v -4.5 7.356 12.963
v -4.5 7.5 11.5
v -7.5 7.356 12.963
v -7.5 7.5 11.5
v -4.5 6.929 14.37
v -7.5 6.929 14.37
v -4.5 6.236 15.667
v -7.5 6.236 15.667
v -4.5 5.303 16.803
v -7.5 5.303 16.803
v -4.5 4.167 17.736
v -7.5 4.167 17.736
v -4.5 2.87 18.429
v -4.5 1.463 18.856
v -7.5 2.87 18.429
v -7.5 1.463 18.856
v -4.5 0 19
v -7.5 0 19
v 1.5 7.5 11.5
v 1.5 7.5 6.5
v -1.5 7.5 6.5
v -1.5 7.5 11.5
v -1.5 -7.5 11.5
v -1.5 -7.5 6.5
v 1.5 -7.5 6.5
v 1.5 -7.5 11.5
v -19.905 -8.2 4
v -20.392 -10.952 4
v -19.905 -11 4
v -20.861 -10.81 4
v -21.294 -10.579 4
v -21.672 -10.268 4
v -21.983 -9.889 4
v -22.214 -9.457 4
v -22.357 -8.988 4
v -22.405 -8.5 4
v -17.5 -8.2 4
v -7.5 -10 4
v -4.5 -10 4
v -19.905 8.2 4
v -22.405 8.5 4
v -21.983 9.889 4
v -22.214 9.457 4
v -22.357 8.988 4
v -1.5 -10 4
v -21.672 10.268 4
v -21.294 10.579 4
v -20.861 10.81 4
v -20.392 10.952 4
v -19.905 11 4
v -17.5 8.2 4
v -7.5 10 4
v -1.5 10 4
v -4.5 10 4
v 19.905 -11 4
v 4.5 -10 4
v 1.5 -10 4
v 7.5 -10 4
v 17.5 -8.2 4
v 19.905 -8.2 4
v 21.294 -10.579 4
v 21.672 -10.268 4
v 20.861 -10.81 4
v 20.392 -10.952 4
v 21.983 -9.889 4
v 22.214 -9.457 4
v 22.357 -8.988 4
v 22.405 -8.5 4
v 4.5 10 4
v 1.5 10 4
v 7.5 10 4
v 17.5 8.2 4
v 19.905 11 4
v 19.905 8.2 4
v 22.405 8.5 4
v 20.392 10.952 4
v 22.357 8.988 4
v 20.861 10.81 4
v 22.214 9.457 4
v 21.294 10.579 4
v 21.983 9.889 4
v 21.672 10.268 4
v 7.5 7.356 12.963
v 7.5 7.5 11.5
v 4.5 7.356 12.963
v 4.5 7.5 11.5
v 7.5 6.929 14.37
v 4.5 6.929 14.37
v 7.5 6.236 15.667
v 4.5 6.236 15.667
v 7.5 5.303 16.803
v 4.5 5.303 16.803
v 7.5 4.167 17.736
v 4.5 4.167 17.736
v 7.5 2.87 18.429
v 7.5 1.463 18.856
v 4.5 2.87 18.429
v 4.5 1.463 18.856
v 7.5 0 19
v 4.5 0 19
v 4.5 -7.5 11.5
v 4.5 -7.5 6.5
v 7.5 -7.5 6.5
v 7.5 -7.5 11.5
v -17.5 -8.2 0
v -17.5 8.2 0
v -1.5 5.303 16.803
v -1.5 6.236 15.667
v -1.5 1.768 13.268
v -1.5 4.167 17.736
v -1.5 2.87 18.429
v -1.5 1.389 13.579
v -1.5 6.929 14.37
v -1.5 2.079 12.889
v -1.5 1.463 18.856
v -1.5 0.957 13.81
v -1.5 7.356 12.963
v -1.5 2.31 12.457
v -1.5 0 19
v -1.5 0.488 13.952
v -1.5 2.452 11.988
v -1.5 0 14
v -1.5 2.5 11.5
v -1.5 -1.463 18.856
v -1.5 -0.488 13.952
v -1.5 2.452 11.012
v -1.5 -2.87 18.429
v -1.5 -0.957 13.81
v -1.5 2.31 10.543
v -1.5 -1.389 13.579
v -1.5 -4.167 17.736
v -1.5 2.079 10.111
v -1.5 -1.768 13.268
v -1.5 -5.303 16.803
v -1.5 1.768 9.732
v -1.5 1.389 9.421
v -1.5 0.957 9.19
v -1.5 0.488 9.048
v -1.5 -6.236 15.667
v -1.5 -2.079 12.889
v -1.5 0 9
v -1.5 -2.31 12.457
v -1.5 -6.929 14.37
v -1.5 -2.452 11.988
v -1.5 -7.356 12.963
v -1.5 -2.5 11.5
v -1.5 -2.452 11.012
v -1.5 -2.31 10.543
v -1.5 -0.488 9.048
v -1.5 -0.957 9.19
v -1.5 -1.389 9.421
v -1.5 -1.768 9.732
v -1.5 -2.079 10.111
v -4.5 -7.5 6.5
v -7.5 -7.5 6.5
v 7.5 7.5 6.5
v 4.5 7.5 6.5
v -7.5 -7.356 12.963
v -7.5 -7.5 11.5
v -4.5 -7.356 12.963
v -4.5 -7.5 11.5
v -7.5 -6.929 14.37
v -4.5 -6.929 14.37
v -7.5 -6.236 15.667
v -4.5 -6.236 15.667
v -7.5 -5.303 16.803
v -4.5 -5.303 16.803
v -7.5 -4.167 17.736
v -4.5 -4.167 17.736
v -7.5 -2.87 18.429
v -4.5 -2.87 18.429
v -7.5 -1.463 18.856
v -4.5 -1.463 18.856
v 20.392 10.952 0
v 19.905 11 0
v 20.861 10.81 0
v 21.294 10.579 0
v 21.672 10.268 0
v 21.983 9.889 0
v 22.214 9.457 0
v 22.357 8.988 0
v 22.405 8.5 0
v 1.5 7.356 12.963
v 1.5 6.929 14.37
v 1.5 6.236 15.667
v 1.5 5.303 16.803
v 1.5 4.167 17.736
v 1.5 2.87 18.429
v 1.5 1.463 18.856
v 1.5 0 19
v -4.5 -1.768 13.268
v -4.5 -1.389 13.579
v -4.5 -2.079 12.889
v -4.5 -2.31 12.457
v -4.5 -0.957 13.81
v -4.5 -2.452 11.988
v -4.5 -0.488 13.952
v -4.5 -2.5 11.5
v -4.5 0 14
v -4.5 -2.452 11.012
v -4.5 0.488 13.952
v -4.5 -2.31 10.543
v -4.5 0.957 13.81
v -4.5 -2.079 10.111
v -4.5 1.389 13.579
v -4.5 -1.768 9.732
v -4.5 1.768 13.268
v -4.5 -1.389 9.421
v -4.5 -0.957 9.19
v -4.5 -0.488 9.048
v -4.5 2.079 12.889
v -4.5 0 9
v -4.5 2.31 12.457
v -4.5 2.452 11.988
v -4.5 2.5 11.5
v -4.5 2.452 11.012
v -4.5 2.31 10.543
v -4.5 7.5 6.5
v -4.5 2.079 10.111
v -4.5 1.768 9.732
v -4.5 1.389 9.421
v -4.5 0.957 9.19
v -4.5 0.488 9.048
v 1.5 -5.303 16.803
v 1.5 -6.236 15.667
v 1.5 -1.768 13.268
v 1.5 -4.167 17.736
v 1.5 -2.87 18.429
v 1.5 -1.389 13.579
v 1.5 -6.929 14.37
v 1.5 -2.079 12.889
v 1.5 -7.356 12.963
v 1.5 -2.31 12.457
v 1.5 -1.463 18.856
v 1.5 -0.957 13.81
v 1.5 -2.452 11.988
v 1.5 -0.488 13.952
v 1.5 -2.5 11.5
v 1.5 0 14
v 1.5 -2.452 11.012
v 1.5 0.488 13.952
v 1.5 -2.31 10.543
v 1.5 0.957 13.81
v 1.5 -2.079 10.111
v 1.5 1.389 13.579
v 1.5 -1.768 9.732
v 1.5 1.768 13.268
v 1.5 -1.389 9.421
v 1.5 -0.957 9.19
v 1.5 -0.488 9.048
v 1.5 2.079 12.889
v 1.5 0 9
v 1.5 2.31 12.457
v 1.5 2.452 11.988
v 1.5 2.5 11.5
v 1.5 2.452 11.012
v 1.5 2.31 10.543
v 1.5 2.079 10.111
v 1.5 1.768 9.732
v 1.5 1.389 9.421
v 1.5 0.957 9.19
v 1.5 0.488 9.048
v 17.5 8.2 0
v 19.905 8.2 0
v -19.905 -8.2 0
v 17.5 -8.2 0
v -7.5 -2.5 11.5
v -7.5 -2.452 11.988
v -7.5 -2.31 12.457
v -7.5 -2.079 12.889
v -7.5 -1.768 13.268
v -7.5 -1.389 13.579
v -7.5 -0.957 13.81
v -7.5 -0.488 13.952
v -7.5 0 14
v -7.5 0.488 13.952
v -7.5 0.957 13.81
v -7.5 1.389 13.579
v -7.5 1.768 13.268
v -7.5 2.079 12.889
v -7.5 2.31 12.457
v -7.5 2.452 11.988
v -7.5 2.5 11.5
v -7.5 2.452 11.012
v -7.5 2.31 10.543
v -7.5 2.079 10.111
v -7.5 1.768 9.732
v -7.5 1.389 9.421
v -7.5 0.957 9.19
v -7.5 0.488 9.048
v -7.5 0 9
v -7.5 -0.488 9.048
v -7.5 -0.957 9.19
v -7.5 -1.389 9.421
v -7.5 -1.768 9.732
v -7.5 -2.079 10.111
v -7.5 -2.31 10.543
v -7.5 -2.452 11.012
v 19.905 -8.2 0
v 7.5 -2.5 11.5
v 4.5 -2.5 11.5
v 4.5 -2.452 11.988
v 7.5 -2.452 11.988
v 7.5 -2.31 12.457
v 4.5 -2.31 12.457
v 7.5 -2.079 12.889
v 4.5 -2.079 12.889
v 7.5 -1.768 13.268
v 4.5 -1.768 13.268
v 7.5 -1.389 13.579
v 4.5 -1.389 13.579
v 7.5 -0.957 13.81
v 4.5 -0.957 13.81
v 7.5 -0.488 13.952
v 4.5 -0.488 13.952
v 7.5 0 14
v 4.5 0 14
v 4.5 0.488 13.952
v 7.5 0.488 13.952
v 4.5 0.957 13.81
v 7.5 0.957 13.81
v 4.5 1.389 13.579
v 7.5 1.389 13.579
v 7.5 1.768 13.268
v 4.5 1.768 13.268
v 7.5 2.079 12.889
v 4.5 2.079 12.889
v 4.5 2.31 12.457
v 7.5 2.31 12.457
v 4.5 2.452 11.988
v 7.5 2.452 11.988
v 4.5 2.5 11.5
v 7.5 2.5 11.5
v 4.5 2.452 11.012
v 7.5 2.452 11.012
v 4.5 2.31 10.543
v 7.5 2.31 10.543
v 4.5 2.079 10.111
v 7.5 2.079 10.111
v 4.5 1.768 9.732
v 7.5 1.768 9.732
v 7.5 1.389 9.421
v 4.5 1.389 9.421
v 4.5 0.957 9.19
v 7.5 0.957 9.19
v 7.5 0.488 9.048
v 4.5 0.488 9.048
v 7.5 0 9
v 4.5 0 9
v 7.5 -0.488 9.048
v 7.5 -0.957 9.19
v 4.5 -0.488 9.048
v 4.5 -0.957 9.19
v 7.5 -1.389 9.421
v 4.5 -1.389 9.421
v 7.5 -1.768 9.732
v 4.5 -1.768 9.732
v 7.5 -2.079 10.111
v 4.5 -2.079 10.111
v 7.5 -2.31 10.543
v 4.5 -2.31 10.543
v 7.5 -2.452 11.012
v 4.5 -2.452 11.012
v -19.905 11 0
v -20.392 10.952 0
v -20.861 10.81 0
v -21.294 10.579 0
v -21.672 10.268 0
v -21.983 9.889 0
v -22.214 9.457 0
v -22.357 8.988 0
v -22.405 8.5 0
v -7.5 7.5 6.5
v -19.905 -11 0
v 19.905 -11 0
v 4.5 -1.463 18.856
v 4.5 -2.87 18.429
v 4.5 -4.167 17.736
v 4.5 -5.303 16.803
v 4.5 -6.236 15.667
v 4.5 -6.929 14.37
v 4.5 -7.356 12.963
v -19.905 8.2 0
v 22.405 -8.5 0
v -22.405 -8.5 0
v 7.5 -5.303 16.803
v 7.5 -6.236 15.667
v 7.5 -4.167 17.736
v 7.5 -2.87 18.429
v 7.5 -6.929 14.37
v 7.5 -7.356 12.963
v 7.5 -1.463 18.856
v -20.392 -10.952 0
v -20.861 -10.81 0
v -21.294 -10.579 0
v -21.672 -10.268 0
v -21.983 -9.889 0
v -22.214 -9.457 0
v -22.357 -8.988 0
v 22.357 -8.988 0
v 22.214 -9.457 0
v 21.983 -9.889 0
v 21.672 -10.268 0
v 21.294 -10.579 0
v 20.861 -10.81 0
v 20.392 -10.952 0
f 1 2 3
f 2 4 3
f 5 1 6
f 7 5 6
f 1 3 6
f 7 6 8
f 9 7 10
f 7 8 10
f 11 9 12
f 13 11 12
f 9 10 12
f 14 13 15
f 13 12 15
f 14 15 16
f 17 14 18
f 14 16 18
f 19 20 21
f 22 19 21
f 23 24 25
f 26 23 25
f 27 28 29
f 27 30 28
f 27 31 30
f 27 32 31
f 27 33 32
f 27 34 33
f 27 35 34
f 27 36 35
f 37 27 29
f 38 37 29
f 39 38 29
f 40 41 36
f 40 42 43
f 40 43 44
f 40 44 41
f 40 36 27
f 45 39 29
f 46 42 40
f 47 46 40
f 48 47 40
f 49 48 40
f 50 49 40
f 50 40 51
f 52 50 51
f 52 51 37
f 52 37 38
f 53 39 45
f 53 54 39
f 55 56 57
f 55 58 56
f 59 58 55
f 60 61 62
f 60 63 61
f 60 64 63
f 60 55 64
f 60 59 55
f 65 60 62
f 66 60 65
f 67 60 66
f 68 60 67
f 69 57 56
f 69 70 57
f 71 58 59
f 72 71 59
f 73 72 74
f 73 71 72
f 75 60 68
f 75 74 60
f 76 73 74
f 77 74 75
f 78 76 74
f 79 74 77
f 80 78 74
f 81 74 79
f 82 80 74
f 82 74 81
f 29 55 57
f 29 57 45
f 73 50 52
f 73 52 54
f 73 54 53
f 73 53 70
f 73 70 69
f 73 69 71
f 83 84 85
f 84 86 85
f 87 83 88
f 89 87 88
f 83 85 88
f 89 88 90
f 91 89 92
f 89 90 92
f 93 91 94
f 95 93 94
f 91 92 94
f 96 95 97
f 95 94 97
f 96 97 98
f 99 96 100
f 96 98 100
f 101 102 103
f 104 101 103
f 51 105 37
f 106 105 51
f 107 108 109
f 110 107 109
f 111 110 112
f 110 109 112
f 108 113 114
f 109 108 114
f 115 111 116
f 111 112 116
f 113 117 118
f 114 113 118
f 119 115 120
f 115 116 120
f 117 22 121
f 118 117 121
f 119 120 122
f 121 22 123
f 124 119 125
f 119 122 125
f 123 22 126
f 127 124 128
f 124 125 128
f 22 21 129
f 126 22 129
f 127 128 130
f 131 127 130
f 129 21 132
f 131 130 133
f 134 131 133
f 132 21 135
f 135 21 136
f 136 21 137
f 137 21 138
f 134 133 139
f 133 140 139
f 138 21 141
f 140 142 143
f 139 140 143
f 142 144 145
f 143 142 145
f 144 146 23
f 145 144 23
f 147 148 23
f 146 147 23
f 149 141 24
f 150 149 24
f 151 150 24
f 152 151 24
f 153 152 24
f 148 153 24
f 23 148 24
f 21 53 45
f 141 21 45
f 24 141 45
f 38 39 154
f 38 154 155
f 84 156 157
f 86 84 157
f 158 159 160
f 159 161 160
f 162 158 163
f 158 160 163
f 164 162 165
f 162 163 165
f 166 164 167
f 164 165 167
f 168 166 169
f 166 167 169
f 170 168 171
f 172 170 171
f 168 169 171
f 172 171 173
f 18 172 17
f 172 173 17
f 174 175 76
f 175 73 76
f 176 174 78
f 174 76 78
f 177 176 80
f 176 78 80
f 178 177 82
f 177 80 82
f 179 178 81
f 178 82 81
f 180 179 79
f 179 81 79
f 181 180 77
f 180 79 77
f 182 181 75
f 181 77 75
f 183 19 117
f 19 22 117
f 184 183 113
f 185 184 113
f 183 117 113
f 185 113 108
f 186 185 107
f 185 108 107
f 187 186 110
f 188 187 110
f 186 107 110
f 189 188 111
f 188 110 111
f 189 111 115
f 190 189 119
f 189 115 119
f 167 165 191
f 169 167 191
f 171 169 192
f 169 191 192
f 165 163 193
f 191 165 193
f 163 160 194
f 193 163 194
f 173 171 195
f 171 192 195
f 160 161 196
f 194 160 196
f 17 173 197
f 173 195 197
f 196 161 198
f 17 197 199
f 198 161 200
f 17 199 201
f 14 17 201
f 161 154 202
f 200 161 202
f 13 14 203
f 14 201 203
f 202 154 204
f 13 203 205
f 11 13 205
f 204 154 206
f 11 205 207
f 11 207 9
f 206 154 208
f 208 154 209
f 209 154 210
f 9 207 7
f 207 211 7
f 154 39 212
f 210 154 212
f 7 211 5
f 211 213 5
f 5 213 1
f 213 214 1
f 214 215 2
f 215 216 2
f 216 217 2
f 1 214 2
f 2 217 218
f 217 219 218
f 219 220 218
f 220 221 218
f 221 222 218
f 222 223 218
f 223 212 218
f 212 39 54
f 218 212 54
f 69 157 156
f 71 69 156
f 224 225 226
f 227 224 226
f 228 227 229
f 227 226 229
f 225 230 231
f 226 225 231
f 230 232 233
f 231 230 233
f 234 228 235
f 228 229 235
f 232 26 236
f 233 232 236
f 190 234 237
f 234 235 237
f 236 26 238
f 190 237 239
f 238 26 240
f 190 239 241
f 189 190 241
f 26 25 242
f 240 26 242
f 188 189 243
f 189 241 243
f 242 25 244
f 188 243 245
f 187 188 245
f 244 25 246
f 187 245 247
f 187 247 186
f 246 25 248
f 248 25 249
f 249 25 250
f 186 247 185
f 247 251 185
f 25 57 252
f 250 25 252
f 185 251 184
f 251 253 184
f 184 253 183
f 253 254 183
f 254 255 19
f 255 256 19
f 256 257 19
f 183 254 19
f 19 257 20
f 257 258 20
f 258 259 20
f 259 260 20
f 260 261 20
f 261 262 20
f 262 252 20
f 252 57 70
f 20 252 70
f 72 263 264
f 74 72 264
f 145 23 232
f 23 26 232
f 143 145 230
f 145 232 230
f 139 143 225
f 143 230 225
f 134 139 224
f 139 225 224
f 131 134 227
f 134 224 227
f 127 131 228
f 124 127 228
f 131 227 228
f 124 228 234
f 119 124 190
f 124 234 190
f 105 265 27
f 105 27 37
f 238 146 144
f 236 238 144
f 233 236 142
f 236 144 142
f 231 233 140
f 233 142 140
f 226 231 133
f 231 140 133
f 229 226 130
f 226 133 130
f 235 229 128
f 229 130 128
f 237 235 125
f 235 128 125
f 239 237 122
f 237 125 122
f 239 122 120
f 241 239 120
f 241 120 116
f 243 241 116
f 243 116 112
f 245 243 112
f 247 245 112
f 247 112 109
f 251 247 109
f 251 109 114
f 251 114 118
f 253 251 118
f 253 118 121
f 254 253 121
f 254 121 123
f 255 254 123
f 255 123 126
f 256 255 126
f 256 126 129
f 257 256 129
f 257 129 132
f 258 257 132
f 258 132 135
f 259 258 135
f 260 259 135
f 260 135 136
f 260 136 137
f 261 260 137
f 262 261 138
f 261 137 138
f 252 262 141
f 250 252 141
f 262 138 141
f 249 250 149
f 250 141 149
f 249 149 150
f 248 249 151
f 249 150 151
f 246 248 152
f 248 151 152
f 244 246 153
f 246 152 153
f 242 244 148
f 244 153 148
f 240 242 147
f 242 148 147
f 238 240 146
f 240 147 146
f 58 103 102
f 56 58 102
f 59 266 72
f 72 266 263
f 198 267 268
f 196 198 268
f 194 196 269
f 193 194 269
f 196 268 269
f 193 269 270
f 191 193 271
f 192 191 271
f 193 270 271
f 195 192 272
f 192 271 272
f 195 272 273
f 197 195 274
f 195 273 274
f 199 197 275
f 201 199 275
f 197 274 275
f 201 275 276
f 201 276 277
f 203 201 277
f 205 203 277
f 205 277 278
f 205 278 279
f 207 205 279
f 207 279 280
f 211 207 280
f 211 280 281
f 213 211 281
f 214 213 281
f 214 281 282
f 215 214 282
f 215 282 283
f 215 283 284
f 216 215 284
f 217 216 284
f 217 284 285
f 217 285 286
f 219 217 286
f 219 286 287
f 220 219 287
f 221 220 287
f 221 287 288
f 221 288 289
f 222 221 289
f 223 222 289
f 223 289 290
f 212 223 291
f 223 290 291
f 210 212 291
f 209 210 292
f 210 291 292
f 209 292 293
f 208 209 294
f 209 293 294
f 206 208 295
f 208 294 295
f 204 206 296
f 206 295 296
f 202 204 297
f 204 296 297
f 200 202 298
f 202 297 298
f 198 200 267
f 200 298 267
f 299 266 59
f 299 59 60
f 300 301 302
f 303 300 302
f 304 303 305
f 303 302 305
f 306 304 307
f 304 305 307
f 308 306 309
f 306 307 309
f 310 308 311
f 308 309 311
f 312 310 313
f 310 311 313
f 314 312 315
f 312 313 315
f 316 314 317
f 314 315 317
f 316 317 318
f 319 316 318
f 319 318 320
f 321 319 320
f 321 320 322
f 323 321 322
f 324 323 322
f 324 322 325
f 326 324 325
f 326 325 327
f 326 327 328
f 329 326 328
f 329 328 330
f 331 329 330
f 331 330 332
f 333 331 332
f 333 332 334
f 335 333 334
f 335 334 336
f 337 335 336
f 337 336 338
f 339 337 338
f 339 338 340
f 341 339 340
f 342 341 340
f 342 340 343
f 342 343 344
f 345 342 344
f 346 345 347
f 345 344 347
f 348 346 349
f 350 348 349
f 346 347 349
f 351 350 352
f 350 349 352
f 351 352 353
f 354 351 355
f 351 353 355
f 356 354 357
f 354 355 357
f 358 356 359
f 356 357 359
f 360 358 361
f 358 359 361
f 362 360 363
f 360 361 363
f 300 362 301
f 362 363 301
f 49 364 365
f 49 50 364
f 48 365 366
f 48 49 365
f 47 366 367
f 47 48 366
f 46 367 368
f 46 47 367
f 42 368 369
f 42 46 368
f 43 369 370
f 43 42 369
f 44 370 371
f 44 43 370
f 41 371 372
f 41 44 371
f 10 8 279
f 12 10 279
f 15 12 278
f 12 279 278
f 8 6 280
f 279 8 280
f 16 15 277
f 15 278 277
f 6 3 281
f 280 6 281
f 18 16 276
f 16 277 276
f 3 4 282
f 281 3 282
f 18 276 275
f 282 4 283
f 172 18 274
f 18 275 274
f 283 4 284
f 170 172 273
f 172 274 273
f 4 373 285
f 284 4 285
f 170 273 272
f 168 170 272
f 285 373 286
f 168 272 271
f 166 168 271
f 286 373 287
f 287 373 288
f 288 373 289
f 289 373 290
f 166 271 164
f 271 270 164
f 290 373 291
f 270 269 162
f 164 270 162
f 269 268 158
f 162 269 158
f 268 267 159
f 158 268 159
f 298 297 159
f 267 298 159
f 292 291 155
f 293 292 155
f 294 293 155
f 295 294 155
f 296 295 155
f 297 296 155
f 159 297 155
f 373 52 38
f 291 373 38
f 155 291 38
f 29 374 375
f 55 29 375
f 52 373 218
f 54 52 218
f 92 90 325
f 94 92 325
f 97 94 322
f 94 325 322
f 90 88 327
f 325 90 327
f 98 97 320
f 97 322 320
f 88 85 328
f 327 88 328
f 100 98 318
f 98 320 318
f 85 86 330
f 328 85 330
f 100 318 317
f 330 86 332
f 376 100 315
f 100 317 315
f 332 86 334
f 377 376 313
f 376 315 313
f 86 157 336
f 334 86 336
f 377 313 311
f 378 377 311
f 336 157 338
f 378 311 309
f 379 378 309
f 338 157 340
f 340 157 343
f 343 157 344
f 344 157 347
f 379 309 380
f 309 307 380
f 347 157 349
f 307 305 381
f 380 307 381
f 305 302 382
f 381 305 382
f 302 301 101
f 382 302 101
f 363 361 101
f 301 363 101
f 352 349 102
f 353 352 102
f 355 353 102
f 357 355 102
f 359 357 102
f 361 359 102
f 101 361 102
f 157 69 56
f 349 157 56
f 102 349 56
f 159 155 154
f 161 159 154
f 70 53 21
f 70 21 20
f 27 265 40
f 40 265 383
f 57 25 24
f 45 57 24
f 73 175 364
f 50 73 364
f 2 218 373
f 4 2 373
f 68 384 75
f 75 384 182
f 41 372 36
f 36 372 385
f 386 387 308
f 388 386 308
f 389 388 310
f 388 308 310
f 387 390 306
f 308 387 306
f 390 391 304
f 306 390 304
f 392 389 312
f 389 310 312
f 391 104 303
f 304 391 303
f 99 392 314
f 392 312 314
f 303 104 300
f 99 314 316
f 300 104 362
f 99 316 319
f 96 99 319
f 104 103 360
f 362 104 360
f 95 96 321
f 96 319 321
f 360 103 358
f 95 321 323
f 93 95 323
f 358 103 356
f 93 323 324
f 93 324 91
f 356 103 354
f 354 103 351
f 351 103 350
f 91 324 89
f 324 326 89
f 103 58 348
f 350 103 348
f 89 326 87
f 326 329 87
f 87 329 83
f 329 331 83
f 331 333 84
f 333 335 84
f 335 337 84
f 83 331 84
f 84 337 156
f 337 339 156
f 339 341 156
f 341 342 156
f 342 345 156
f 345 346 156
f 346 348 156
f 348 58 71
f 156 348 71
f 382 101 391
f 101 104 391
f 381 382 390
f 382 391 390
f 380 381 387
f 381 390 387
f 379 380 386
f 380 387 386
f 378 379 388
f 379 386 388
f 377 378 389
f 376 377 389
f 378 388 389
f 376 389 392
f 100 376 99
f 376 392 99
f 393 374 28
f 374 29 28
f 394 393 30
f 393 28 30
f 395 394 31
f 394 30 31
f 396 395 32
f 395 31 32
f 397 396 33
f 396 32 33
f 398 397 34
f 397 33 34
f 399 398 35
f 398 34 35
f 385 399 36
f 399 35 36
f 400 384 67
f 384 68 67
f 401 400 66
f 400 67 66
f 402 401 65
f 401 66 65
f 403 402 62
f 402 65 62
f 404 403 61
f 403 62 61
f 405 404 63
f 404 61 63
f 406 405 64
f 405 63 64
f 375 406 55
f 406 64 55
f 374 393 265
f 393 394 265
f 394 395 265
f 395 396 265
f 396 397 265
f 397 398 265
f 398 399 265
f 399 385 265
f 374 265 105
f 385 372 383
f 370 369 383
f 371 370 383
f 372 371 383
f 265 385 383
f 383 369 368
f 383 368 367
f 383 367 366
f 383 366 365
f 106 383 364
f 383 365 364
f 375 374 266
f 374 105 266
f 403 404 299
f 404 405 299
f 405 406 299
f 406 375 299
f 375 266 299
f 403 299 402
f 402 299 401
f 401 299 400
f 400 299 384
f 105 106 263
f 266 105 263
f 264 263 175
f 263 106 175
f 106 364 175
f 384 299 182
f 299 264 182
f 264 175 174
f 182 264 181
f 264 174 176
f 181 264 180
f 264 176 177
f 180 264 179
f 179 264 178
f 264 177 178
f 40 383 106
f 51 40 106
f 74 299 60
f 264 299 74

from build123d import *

# Parameters (mm, degrees)
F0_W     = 2.4047140032
F0_H     = 16.4
F0_W_2   = 3
F0_H_2   = 7.5
F0_W_3   = 1.5
F1_DEPTH = 4
F2_DEPTH = 19
F3_R     = 7.49999
F4_R     = 2.5
F5_DEPTH = 29.9057140032
F6_SIZE  = 2.5
F7_R     = 2.5


# Not quite as in the source:
# - a fillet or chamfer is up to 0.001 mm smaller than in the source, because OpenCascade refuses the exact size
# - a feature names something its author has since deleted; it is built from what else it names


with BuildPart() as f1:
    # F0 (on Top) → F1 (new body)
    with BuildSketch(Plane.XY):
        Polygon((-5.6430239742, 11), (-22.4047140032, 11), (-22.4047140032, -11), (22.4047140032, -11), (22.4047140032, 11), (5.6430239742, 11), (0, 11), align=None)
        with Locations((-18.7023570016, 0)):
            Rectangle(F0_W, F0_H, mode=Mode.SUBTRACT)
        Polygon((-1.5, 7.5), (0, 7.5), (1.5, 7.5), (4.5, 7.5), (7.5, 7.5), (7.5, -7.5), (4.5, -7.5), (4.5, 0), (1.5, 0), (1.5, -7.5), (-1.5, -7.5), (-1.5, 0), (-4.5, 0), (-4.5, -7.5), (-7.5, -7.5), (-7.5, 7.5), (-4.5, 7.5), align=None, mode=Mode.SUBTRACT)
        with Locations((18.7023570016, 0)):
            Rectangle(F0_W, F0_H, mode=Mode.SUBTRACT)
        Polygon((-4.5, 0), (-4.5, 7.5), (-7.5, 7.5), (-7.5, -7.5), (-4.5, -7.5), align=None)
        with Locations((-3, 3.75)):
            Rectangle(F0_W_2, F0_H_2)
        with Locations((-0.75, 3.75)):
            Rectangle(F0_W_3, F0_H_2)
        with Locations((0.75, 3.75)):
            Rectangle(F0_W_3, F0_H_2)
        Polygon((1.5, 0), (0, 0), (-1.5, 0), (-1.5, -7.5), (1.5, -7.5), align=None)
        with Locations((3, 3.75)):
            Rectangle(F0_W_2, F0_H_2)
        Polygon((7.5, 7.5), (4.5, 7.5), (4.5, 0), (4.5, -7.5), (7.5, -7.5), align=None)
    extrude(amount=F1_DEPTH)

    # F0 (on Top) → F2 (join)
    with BuildSketch(Plane.XY):
        Polygon((-4.5, 0), (-4.5, 7.5), (-7.5, 7.5), (-7.5, -7.5), (-4.5, -7.5), align=None)
        with Locations((-0.75, 3.75)):
            Rectangle(F0_W_3, F0_H_2)
        with Locations((0.75, 3.75)):
            Rectangle(F0_W_3, F0_H_2)
        Polygon((1.5, 0), (0, 0), (-1.5, 0), (-1.5, -7.5), (1.5, -7.5), align=None)
        Polygon((7.5, 7.5), (4.5, 7.5), (4.5, 0), (4.5, -7.5), (7.5, -7.5), align=None)
    extrude(amount=F2_DEPTH)

    # F3 (radius 7.5 in the source; OpenCascade refuses exactly that, so slightly less here)
    f3_edges = [f1.edges().sort_by_distance(p)[0] for p in [
        (-6, -7.5, 19),
        (0, -7.5, 19),
        (6, -7.5, 19),
        (6, 7.5, 19),
        (0, 7.5, 19),
        (-6, 7.5, 19),
    ]]
    fillet(f3_edges, radius=F3_R)

    # F4 (on face) → F5 (cut, through all)
    with BuildSketch(Plane(origin=(-7.5, 0, 0), x_dir=(0, -1, 0), z_dir=(-1, 0, 0))):
        with Locations((0, 11.5)):
            Circle(F4_R)
    extrude(amount=-F5_DEPTH, mode=Mode.SUBTRACT)

    # F6
    f6_edges = [f1.edges().sort_by_distance(p)[0] for p in [
        (-6, 7.5, 4),
        (0, 7.5, 4),
        (6, 7.5, 4),
        (-6, -7.5, 4),
        (0, -7.5, 4),
        (6, -7.5, 4),
    ]]
    chamfer(f6_edges, length=F6_SIZE)

    # F7
    f7_edges = [f1.edges().sort_by_distance(p)[0] for p in [
        (-22.404714, 11, 2),
        (-22.404714, -11, 2),
        (22.404714, -11, 2),
        (22.404714, 11, 2),
    ]]
    fillet(f7_edges, radius=F7_R)


solid = f1.part
